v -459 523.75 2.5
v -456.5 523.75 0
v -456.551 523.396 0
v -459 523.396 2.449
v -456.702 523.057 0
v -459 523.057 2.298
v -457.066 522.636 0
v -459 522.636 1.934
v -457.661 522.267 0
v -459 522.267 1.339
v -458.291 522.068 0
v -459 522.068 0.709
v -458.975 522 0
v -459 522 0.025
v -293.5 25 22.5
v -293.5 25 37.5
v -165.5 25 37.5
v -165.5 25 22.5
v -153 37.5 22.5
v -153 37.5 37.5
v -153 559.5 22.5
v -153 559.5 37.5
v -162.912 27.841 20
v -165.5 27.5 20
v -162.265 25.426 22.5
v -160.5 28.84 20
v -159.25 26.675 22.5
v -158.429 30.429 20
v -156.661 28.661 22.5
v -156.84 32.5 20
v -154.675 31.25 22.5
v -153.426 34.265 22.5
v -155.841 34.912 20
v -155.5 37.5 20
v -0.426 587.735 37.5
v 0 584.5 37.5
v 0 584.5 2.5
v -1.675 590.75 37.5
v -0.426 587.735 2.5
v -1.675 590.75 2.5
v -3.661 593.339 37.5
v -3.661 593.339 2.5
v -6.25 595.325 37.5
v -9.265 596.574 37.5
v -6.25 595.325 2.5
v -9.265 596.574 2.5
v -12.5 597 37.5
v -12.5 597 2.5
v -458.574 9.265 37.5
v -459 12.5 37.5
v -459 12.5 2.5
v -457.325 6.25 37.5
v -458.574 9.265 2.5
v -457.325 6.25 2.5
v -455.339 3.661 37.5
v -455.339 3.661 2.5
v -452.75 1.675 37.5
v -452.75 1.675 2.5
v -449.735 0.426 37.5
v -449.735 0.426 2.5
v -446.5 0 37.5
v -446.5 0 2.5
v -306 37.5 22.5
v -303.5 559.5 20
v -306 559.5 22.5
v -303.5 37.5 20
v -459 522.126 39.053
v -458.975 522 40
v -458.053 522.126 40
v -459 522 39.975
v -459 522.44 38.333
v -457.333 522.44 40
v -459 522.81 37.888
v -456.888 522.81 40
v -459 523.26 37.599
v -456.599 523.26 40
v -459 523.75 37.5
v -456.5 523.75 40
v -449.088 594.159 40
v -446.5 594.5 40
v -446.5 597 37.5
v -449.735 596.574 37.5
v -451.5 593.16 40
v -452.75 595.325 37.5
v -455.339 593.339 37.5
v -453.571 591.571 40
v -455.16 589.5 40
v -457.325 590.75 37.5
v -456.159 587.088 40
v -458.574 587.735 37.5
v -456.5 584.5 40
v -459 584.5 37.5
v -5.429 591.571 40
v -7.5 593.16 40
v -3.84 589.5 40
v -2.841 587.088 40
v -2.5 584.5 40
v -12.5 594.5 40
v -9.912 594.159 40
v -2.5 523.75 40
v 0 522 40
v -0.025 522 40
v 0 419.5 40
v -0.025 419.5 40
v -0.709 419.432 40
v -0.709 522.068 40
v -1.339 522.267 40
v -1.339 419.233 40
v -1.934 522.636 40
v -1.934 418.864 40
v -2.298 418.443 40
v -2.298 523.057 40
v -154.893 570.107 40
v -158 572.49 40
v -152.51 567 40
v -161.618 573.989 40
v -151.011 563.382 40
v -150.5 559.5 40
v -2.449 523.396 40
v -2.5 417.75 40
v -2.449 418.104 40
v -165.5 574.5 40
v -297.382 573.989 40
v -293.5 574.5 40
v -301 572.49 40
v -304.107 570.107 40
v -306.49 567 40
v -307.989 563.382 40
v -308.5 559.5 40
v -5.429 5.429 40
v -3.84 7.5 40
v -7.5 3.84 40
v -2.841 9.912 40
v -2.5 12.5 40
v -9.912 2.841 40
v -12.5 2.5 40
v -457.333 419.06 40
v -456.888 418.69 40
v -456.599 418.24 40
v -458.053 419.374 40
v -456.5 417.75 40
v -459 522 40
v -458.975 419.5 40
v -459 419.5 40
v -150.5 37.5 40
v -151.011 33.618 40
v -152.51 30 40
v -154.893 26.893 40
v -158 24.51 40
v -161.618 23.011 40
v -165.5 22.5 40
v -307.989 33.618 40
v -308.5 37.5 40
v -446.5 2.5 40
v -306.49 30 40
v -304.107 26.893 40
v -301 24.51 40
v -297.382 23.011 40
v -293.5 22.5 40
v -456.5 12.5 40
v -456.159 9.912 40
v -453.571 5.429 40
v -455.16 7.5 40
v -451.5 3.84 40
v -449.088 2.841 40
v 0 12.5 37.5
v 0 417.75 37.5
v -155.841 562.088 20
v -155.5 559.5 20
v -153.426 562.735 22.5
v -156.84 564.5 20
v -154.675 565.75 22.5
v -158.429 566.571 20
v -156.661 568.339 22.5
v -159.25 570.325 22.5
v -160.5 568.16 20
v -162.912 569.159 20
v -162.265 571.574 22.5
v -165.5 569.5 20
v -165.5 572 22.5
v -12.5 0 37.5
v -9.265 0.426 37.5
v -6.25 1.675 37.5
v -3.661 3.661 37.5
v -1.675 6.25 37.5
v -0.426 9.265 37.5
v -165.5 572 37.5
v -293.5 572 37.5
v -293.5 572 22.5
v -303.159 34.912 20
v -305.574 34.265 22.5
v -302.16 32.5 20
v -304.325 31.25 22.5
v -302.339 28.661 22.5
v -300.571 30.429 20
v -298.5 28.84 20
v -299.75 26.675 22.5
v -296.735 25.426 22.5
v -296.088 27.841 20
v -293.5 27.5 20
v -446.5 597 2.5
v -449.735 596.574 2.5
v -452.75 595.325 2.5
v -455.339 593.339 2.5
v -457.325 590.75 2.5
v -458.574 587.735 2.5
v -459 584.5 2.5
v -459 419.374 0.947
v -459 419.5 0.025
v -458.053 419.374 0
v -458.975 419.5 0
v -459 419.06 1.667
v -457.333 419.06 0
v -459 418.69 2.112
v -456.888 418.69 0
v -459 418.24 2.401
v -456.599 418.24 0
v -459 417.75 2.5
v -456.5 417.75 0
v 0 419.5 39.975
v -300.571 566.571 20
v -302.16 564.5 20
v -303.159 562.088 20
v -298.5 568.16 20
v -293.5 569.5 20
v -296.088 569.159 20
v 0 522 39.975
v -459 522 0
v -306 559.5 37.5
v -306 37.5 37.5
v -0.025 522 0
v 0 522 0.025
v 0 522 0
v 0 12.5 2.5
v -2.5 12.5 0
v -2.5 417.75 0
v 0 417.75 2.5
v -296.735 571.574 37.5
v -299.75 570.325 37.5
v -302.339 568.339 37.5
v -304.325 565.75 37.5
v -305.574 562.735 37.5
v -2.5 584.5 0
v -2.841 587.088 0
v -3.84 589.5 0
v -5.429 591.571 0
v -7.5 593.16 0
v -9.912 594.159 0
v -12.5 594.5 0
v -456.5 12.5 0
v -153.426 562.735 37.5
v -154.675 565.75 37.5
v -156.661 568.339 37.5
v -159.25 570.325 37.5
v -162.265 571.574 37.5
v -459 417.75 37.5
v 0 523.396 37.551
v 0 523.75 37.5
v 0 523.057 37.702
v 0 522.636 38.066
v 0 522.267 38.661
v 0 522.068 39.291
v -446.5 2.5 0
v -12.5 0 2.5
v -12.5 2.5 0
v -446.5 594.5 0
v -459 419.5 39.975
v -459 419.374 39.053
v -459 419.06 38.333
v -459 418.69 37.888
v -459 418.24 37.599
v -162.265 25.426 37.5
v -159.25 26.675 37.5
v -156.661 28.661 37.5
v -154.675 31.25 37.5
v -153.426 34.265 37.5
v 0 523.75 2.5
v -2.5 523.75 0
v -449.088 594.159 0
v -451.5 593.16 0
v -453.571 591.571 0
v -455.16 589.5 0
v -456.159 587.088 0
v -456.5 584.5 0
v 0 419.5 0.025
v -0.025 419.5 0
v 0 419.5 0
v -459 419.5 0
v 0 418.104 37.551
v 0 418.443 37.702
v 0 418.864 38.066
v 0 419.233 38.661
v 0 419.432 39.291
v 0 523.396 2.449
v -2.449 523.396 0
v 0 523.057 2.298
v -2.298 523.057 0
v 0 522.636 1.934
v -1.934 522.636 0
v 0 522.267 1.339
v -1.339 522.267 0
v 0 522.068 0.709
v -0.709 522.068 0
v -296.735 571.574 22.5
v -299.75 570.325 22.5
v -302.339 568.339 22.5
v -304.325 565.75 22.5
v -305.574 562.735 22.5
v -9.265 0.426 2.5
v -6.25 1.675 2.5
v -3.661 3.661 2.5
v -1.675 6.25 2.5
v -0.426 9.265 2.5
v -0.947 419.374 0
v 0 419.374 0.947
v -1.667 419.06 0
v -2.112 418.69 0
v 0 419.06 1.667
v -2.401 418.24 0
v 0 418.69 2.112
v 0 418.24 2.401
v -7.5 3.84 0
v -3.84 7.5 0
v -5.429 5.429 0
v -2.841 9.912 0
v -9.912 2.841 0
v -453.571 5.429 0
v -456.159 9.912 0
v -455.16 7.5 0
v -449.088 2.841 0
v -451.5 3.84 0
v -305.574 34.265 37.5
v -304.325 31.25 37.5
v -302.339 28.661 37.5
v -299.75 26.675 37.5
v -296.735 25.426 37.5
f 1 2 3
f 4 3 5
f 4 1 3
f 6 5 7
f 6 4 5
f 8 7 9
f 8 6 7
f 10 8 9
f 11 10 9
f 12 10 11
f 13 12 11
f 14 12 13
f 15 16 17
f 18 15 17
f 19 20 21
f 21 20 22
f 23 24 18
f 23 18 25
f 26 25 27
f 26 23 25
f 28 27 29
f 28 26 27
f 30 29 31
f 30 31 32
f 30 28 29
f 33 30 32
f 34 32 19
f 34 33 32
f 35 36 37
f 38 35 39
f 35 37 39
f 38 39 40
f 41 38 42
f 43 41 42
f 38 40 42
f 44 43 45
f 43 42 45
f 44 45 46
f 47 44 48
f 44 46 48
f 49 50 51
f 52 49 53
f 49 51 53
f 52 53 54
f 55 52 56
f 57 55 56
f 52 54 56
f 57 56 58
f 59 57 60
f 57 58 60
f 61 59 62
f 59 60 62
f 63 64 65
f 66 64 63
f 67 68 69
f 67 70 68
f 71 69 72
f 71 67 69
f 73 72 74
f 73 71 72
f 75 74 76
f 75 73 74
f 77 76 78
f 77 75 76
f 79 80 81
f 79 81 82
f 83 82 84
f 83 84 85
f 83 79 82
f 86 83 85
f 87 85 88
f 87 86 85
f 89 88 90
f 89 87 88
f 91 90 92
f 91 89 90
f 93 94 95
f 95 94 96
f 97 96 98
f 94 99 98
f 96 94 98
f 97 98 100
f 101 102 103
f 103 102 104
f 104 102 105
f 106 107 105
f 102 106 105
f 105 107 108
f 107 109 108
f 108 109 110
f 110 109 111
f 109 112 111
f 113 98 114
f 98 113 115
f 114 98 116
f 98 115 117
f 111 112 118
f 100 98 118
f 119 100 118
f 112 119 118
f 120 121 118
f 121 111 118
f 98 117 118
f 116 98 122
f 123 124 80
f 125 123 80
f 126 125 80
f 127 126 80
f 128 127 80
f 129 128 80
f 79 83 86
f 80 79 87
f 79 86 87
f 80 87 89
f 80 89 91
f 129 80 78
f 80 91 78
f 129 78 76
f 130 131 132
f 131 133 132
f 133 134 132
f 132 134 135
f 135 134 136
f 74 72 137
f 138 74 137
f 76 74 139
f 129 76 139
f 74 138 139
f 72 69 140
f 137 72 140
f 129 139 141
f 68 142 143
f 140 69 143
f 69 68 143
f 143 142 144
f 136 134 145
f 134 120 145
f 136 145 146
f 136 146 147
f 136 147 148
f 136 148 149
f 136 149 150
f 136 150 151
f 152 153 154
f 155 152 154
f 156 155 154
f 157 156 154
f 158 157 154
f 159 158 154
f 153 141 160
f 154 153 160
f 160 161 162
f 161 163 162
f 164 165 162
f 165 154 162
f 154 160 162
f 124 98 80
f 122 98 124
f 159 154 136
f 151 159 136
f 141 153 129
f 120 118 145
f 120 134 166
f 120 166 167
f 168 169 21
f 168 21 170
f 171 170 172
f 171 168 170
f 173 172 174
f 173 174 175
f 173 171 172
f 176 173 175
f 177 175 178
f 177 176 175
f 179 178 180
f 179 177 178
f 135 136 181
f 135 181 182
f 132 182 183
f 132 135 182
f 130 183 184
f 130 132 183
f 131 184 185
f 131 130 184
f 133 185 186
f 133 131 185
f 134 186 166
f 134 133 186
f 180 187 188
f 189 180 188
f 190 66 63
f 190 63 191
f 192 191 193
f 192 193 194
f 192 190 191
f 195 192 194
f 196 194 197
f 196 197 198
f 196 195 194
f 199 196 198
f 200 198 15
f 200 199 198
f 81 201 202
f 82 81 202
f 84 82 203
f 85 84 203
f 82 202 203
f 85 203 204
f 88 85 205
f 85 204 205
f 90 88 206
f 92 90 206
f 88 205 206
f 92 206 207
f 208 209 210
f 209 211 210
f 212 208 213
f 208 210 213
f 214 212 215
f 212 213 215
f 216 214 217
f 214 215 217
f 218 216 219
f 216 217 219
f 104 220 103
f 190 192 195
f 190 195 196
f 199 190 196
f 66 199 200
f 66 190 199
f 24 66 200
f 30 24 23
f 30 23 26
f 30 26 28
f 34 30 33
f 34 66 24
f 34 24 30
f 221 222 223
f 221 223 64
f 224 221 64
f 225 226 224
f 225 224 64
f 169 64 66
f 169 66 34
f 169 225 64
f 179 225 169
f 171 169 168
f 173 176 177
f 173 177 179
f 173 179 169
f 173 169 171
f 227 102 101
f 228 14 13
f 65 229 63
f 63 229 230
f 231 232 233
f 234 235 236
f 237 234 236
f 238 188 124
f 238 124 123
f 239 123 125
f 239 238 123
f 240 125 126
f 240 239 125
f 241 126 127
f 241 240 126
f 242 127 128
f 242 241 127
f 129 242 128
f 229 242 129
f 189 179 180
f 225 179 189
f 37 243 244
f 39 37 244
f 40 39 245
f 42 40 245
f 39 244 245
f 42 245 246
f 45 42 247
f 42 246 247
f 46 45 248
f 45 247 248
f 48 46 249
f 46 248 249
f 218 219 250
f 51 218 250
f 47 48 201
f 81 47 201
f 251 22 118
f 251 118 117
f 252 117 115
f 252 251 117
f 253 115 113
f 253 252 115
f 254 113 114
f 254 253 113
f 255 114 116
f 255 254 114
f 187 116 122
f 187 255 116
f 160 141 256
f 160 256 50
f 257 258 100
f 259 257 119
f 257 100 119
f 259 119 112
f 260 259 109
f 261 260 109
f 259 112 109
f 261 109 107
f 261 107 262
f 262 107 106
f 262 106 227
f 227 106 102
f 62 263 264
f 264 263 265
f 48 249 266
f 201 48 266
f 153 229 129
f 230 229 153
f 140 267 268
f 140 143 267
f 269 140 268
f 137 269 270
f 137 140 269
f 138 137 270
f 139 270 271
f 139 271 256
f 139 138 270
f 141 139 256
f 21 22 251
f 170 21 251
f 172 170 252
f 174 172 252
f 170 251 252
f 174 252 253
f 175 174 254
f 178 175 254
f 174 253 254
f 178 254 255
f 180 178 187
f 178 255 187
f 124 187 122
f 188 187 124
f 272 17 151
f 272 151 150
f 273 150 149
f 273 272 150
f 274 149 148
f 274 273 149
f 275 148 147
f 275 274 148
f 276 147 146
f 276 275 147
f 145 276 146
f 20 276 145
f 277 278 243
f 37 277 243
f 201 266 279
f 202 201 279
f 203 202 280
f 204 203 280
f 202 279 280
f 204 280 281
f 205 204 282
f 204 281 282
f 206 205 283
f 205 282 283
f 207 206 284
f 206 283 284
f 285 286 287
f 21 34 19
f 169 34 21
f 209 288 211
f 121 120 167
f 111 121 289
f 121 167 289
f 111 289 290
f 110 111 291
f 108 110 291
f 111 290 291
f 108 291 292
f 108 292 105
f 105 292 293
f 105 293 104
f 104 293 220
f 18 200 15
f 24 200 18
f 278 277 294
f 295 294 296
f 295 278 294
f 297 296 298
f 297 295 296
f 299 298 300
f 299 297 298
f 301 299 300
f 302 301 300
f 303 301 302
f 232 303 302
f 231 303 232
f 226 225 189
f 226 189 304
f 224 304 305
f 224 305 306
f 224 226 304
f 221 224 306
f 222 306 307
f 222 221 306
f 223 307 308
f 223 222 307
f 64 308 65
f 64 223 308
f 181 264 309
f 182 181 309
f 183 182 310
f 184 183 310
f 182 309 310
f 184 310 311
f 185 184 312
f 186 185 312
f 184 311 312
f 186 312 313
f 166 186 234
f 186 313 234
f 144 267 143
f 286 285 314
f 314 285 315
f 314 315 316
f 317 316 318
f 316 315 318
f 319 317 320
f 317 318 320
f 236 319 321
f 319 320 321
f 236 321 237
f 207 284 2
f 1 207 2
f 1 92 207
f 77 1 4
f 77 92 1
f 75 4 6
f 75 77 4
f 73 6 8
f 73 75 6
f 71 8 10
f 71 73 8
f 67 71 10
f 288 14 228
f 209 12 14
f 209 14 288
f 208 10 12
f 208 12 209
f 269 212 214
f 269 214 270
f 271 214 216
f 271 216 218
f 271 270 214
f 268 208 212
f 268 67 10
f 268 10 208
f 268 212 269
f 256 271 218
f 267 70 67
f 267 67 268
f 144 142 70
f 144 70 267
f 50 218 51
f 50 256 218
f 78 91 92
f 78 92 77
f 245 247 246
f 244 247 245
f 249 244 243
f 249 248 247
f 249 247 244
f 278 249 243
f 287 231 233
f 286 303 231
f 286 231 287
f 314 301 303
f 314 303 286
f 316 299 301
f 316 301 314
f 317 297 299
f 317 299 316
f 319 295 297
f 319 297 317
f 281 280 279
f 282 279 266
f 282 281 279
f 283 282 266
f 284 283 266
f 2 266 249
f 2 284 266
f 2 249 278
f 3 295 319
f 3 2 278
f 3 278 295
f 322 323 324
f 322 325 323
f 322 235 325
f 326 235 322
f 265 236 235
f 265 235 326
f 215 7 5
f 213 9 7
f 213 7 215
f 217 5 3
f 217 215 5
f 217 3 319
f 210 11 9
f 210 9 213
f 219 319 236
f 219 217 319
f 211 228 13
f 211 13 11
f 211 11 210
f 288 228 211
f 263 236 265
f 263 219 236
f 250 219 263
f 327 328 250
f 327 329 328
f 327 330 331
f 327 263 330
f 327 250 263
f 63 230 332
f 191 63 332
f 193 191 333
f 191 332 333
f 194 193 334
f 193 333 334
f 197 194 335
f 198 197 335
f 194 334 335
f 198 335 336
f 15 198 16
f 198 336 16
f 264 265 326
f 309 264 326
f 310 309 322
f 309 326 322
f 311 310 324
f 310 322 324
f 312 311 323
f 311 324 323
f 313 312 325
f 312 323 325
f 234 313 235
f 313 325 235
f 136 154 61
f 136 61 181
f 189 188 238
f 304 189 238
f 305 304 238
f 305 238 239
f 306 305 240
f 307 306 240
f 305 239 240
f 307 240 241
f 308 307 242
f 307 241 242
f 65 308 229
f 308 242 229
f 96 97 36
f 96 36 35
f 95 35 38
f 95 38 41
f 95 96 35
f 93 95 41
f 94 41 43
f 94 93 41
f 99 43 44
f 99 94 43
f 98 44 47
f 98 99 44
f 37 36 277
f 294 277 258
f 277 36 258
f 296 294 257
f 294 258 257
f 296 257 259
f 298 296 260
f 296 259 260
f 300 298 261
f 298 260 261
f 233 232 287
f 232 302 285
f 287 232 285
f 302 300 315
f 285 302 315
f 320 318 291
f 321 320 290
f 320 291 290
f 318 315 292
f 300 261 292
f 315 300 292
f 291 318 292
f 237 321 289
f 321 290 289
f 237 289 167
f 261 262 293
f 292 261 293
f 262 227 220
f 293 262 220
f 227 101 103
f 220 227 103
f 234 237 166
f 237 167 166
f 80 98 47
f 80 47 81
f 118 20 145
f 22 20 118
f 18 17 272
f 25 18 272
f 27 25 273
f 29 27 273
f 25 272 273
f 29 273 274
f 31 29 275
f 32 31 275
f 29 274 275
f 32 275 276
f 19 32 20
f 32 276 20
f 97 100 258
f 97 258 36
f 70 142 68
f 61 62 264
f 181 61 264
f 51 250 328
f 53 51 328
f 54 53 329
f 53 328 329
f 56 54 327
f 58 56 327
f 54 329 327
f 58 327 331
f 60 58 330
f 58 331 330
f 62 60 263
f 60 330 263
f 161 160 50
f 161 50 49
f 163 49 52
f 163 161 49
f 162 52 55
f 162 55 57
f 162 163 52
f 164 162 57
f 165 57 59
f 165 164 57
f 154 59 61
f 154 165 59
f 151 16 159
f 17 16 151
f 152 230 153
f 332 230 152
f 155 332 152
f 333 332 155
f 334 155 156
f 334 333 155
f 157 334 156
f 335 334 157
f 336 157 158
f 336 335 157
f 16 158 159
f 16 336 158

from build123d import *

# Parameters (mm, degrees)
F1_DEPTH = 40
F2_SIZE  = 2.5
F3_W     = 102.5
F3_H     = 35
F3_H_2   = 2.5
F4_DEPTH = 459
F6_DEPTH = 20
F7_SIZE  = 2.5
F8_R     = 1.75


with BuildPart() as f1:
    # F0 (on Top) → F1 (new body)
    with BuildSketch(Plane.XY):
        with BuildLine():
            Line((-446.5, 0), (-12.5, 0))
            ThreePointArc((-12.5, 0), (-3.6611652352, 3.6611652352), (0, 12.5))
            Line((0, 12.5), (0, 584.5))
            ThreePointArc((0, 584.5), (-3.6611652352, 593.3388347648), (-12.5, 597))
            Line((-12.5, 597), (-446.5, 597))
            ThreePointArc((-446.5, 597), (-455.3388347648, 593.3388347648), (-459, 584.5))
            Line((-459, 584.5), (-459, 12.5))
            ThreePointArc((-459, 12.5), (-455.3388347648, 3.6611652352), (-446.5, 0))
        make_face()
    extrude(amount=F1_DEPTH)

    # F2
    f2_edges = [f1.edges().sort_by_distance(p)[0] for p in [
        (-229.5, 0, 40),
        (-3.661165, 3.661165, 40),
        (0, 298.5, 40),
        (-3.661165, 593.338835, 40),
        (-229.5, 597, 40),
        (-455.338835, 593.338835, 40),
        (-459, 298.5, 40),
        (-455.338835, 3.661165, 40),
        (-229.5, 0, 0),
        (-3.661165, 3.661165, 0),
        (0, 298.5, 0),
        (-3.661165, 593.338835, 0),
        (-229.5, 597, 0),
        (-455.338835, 593.338835, 0),
        (-459, 298.5, 0),
        (-455.338835, 3.661165, 0),
    ]]
    chamfer(f2_edges, length=F2_SIZE)

    # F3 (on face) → F4 (join)
    with BuildSketch(Plane(origin=(-459, 0, 0), x_dir=(0, -1, 0), z_dir=(-1, 0, 0))):
        with Locations((-470.75, 20)):
            Rectangle(F3_W, F3_H)
        with Locations((-470.75, 38.75)):
            Rectangle(F3_W, F3_H_2)
        with Locations((-470.75, 1.25)):
            Rectangle(F3_W, F3_H_2)
    extrude(amount=-F4_DEPTH)

    # F5 (on face) → F6 (cut)
    with BuildSketch(Plane.XY.offset(40)):
        with BuildLine():
            Line((-165.5, 572), (-293.5, 572))
            ThreePointArc((-293.5, 572), (-302.3388347648, 568.3388347648), (-306, 559.5))
            Line((-306, 559.5), (-306, 37.5))
            ThreePointArc((-306, 37.5), (-302.3388347648, 28.6611652352), (-293.5, 25))
            Line((-293.5, 25), (-165.5, 25))
            ThreePointArc((-165.5, 25), (-156.6611652352, 28.6611652352), (-153, 37.5))
            Line((-153, 37.5), (-153, 559.5))
            ThreePointArc((-153, 559.5), (-156.6611652352, 568.3388347648), (-165.5, 572))
        make_face()
    extrude(amount=-F6_DEPTH, mode=Mode.SUBTRACT)

    # F7
    f7_edges = [f1.edges().sort_by_distance(p)[0] for p in [
        (-306, 298.5, 40),
        (-229.5, 572, 20),
    ]]
    chamfer(f7_edges, length=F7_SIZE)

    # F8
    f8_edges = [f1.edges().sort_by_distance(p)[0] for p in [
        (-1.25, 419.5, 38.75),
        (-1.25, 522, 38.75),
        (-1.25, 419.5, 1.25),
        (-1.25, 522, 1.25),
        (-457.75, 522, 38.75),
        (-457.75, 419.5, 38.75),
        (-457.75, 522, 1.25),
        (-457.75, 419.5, 1.25),
    ]]
    fillet(f8_edges, radius=F8_R)


solid = f1.part
